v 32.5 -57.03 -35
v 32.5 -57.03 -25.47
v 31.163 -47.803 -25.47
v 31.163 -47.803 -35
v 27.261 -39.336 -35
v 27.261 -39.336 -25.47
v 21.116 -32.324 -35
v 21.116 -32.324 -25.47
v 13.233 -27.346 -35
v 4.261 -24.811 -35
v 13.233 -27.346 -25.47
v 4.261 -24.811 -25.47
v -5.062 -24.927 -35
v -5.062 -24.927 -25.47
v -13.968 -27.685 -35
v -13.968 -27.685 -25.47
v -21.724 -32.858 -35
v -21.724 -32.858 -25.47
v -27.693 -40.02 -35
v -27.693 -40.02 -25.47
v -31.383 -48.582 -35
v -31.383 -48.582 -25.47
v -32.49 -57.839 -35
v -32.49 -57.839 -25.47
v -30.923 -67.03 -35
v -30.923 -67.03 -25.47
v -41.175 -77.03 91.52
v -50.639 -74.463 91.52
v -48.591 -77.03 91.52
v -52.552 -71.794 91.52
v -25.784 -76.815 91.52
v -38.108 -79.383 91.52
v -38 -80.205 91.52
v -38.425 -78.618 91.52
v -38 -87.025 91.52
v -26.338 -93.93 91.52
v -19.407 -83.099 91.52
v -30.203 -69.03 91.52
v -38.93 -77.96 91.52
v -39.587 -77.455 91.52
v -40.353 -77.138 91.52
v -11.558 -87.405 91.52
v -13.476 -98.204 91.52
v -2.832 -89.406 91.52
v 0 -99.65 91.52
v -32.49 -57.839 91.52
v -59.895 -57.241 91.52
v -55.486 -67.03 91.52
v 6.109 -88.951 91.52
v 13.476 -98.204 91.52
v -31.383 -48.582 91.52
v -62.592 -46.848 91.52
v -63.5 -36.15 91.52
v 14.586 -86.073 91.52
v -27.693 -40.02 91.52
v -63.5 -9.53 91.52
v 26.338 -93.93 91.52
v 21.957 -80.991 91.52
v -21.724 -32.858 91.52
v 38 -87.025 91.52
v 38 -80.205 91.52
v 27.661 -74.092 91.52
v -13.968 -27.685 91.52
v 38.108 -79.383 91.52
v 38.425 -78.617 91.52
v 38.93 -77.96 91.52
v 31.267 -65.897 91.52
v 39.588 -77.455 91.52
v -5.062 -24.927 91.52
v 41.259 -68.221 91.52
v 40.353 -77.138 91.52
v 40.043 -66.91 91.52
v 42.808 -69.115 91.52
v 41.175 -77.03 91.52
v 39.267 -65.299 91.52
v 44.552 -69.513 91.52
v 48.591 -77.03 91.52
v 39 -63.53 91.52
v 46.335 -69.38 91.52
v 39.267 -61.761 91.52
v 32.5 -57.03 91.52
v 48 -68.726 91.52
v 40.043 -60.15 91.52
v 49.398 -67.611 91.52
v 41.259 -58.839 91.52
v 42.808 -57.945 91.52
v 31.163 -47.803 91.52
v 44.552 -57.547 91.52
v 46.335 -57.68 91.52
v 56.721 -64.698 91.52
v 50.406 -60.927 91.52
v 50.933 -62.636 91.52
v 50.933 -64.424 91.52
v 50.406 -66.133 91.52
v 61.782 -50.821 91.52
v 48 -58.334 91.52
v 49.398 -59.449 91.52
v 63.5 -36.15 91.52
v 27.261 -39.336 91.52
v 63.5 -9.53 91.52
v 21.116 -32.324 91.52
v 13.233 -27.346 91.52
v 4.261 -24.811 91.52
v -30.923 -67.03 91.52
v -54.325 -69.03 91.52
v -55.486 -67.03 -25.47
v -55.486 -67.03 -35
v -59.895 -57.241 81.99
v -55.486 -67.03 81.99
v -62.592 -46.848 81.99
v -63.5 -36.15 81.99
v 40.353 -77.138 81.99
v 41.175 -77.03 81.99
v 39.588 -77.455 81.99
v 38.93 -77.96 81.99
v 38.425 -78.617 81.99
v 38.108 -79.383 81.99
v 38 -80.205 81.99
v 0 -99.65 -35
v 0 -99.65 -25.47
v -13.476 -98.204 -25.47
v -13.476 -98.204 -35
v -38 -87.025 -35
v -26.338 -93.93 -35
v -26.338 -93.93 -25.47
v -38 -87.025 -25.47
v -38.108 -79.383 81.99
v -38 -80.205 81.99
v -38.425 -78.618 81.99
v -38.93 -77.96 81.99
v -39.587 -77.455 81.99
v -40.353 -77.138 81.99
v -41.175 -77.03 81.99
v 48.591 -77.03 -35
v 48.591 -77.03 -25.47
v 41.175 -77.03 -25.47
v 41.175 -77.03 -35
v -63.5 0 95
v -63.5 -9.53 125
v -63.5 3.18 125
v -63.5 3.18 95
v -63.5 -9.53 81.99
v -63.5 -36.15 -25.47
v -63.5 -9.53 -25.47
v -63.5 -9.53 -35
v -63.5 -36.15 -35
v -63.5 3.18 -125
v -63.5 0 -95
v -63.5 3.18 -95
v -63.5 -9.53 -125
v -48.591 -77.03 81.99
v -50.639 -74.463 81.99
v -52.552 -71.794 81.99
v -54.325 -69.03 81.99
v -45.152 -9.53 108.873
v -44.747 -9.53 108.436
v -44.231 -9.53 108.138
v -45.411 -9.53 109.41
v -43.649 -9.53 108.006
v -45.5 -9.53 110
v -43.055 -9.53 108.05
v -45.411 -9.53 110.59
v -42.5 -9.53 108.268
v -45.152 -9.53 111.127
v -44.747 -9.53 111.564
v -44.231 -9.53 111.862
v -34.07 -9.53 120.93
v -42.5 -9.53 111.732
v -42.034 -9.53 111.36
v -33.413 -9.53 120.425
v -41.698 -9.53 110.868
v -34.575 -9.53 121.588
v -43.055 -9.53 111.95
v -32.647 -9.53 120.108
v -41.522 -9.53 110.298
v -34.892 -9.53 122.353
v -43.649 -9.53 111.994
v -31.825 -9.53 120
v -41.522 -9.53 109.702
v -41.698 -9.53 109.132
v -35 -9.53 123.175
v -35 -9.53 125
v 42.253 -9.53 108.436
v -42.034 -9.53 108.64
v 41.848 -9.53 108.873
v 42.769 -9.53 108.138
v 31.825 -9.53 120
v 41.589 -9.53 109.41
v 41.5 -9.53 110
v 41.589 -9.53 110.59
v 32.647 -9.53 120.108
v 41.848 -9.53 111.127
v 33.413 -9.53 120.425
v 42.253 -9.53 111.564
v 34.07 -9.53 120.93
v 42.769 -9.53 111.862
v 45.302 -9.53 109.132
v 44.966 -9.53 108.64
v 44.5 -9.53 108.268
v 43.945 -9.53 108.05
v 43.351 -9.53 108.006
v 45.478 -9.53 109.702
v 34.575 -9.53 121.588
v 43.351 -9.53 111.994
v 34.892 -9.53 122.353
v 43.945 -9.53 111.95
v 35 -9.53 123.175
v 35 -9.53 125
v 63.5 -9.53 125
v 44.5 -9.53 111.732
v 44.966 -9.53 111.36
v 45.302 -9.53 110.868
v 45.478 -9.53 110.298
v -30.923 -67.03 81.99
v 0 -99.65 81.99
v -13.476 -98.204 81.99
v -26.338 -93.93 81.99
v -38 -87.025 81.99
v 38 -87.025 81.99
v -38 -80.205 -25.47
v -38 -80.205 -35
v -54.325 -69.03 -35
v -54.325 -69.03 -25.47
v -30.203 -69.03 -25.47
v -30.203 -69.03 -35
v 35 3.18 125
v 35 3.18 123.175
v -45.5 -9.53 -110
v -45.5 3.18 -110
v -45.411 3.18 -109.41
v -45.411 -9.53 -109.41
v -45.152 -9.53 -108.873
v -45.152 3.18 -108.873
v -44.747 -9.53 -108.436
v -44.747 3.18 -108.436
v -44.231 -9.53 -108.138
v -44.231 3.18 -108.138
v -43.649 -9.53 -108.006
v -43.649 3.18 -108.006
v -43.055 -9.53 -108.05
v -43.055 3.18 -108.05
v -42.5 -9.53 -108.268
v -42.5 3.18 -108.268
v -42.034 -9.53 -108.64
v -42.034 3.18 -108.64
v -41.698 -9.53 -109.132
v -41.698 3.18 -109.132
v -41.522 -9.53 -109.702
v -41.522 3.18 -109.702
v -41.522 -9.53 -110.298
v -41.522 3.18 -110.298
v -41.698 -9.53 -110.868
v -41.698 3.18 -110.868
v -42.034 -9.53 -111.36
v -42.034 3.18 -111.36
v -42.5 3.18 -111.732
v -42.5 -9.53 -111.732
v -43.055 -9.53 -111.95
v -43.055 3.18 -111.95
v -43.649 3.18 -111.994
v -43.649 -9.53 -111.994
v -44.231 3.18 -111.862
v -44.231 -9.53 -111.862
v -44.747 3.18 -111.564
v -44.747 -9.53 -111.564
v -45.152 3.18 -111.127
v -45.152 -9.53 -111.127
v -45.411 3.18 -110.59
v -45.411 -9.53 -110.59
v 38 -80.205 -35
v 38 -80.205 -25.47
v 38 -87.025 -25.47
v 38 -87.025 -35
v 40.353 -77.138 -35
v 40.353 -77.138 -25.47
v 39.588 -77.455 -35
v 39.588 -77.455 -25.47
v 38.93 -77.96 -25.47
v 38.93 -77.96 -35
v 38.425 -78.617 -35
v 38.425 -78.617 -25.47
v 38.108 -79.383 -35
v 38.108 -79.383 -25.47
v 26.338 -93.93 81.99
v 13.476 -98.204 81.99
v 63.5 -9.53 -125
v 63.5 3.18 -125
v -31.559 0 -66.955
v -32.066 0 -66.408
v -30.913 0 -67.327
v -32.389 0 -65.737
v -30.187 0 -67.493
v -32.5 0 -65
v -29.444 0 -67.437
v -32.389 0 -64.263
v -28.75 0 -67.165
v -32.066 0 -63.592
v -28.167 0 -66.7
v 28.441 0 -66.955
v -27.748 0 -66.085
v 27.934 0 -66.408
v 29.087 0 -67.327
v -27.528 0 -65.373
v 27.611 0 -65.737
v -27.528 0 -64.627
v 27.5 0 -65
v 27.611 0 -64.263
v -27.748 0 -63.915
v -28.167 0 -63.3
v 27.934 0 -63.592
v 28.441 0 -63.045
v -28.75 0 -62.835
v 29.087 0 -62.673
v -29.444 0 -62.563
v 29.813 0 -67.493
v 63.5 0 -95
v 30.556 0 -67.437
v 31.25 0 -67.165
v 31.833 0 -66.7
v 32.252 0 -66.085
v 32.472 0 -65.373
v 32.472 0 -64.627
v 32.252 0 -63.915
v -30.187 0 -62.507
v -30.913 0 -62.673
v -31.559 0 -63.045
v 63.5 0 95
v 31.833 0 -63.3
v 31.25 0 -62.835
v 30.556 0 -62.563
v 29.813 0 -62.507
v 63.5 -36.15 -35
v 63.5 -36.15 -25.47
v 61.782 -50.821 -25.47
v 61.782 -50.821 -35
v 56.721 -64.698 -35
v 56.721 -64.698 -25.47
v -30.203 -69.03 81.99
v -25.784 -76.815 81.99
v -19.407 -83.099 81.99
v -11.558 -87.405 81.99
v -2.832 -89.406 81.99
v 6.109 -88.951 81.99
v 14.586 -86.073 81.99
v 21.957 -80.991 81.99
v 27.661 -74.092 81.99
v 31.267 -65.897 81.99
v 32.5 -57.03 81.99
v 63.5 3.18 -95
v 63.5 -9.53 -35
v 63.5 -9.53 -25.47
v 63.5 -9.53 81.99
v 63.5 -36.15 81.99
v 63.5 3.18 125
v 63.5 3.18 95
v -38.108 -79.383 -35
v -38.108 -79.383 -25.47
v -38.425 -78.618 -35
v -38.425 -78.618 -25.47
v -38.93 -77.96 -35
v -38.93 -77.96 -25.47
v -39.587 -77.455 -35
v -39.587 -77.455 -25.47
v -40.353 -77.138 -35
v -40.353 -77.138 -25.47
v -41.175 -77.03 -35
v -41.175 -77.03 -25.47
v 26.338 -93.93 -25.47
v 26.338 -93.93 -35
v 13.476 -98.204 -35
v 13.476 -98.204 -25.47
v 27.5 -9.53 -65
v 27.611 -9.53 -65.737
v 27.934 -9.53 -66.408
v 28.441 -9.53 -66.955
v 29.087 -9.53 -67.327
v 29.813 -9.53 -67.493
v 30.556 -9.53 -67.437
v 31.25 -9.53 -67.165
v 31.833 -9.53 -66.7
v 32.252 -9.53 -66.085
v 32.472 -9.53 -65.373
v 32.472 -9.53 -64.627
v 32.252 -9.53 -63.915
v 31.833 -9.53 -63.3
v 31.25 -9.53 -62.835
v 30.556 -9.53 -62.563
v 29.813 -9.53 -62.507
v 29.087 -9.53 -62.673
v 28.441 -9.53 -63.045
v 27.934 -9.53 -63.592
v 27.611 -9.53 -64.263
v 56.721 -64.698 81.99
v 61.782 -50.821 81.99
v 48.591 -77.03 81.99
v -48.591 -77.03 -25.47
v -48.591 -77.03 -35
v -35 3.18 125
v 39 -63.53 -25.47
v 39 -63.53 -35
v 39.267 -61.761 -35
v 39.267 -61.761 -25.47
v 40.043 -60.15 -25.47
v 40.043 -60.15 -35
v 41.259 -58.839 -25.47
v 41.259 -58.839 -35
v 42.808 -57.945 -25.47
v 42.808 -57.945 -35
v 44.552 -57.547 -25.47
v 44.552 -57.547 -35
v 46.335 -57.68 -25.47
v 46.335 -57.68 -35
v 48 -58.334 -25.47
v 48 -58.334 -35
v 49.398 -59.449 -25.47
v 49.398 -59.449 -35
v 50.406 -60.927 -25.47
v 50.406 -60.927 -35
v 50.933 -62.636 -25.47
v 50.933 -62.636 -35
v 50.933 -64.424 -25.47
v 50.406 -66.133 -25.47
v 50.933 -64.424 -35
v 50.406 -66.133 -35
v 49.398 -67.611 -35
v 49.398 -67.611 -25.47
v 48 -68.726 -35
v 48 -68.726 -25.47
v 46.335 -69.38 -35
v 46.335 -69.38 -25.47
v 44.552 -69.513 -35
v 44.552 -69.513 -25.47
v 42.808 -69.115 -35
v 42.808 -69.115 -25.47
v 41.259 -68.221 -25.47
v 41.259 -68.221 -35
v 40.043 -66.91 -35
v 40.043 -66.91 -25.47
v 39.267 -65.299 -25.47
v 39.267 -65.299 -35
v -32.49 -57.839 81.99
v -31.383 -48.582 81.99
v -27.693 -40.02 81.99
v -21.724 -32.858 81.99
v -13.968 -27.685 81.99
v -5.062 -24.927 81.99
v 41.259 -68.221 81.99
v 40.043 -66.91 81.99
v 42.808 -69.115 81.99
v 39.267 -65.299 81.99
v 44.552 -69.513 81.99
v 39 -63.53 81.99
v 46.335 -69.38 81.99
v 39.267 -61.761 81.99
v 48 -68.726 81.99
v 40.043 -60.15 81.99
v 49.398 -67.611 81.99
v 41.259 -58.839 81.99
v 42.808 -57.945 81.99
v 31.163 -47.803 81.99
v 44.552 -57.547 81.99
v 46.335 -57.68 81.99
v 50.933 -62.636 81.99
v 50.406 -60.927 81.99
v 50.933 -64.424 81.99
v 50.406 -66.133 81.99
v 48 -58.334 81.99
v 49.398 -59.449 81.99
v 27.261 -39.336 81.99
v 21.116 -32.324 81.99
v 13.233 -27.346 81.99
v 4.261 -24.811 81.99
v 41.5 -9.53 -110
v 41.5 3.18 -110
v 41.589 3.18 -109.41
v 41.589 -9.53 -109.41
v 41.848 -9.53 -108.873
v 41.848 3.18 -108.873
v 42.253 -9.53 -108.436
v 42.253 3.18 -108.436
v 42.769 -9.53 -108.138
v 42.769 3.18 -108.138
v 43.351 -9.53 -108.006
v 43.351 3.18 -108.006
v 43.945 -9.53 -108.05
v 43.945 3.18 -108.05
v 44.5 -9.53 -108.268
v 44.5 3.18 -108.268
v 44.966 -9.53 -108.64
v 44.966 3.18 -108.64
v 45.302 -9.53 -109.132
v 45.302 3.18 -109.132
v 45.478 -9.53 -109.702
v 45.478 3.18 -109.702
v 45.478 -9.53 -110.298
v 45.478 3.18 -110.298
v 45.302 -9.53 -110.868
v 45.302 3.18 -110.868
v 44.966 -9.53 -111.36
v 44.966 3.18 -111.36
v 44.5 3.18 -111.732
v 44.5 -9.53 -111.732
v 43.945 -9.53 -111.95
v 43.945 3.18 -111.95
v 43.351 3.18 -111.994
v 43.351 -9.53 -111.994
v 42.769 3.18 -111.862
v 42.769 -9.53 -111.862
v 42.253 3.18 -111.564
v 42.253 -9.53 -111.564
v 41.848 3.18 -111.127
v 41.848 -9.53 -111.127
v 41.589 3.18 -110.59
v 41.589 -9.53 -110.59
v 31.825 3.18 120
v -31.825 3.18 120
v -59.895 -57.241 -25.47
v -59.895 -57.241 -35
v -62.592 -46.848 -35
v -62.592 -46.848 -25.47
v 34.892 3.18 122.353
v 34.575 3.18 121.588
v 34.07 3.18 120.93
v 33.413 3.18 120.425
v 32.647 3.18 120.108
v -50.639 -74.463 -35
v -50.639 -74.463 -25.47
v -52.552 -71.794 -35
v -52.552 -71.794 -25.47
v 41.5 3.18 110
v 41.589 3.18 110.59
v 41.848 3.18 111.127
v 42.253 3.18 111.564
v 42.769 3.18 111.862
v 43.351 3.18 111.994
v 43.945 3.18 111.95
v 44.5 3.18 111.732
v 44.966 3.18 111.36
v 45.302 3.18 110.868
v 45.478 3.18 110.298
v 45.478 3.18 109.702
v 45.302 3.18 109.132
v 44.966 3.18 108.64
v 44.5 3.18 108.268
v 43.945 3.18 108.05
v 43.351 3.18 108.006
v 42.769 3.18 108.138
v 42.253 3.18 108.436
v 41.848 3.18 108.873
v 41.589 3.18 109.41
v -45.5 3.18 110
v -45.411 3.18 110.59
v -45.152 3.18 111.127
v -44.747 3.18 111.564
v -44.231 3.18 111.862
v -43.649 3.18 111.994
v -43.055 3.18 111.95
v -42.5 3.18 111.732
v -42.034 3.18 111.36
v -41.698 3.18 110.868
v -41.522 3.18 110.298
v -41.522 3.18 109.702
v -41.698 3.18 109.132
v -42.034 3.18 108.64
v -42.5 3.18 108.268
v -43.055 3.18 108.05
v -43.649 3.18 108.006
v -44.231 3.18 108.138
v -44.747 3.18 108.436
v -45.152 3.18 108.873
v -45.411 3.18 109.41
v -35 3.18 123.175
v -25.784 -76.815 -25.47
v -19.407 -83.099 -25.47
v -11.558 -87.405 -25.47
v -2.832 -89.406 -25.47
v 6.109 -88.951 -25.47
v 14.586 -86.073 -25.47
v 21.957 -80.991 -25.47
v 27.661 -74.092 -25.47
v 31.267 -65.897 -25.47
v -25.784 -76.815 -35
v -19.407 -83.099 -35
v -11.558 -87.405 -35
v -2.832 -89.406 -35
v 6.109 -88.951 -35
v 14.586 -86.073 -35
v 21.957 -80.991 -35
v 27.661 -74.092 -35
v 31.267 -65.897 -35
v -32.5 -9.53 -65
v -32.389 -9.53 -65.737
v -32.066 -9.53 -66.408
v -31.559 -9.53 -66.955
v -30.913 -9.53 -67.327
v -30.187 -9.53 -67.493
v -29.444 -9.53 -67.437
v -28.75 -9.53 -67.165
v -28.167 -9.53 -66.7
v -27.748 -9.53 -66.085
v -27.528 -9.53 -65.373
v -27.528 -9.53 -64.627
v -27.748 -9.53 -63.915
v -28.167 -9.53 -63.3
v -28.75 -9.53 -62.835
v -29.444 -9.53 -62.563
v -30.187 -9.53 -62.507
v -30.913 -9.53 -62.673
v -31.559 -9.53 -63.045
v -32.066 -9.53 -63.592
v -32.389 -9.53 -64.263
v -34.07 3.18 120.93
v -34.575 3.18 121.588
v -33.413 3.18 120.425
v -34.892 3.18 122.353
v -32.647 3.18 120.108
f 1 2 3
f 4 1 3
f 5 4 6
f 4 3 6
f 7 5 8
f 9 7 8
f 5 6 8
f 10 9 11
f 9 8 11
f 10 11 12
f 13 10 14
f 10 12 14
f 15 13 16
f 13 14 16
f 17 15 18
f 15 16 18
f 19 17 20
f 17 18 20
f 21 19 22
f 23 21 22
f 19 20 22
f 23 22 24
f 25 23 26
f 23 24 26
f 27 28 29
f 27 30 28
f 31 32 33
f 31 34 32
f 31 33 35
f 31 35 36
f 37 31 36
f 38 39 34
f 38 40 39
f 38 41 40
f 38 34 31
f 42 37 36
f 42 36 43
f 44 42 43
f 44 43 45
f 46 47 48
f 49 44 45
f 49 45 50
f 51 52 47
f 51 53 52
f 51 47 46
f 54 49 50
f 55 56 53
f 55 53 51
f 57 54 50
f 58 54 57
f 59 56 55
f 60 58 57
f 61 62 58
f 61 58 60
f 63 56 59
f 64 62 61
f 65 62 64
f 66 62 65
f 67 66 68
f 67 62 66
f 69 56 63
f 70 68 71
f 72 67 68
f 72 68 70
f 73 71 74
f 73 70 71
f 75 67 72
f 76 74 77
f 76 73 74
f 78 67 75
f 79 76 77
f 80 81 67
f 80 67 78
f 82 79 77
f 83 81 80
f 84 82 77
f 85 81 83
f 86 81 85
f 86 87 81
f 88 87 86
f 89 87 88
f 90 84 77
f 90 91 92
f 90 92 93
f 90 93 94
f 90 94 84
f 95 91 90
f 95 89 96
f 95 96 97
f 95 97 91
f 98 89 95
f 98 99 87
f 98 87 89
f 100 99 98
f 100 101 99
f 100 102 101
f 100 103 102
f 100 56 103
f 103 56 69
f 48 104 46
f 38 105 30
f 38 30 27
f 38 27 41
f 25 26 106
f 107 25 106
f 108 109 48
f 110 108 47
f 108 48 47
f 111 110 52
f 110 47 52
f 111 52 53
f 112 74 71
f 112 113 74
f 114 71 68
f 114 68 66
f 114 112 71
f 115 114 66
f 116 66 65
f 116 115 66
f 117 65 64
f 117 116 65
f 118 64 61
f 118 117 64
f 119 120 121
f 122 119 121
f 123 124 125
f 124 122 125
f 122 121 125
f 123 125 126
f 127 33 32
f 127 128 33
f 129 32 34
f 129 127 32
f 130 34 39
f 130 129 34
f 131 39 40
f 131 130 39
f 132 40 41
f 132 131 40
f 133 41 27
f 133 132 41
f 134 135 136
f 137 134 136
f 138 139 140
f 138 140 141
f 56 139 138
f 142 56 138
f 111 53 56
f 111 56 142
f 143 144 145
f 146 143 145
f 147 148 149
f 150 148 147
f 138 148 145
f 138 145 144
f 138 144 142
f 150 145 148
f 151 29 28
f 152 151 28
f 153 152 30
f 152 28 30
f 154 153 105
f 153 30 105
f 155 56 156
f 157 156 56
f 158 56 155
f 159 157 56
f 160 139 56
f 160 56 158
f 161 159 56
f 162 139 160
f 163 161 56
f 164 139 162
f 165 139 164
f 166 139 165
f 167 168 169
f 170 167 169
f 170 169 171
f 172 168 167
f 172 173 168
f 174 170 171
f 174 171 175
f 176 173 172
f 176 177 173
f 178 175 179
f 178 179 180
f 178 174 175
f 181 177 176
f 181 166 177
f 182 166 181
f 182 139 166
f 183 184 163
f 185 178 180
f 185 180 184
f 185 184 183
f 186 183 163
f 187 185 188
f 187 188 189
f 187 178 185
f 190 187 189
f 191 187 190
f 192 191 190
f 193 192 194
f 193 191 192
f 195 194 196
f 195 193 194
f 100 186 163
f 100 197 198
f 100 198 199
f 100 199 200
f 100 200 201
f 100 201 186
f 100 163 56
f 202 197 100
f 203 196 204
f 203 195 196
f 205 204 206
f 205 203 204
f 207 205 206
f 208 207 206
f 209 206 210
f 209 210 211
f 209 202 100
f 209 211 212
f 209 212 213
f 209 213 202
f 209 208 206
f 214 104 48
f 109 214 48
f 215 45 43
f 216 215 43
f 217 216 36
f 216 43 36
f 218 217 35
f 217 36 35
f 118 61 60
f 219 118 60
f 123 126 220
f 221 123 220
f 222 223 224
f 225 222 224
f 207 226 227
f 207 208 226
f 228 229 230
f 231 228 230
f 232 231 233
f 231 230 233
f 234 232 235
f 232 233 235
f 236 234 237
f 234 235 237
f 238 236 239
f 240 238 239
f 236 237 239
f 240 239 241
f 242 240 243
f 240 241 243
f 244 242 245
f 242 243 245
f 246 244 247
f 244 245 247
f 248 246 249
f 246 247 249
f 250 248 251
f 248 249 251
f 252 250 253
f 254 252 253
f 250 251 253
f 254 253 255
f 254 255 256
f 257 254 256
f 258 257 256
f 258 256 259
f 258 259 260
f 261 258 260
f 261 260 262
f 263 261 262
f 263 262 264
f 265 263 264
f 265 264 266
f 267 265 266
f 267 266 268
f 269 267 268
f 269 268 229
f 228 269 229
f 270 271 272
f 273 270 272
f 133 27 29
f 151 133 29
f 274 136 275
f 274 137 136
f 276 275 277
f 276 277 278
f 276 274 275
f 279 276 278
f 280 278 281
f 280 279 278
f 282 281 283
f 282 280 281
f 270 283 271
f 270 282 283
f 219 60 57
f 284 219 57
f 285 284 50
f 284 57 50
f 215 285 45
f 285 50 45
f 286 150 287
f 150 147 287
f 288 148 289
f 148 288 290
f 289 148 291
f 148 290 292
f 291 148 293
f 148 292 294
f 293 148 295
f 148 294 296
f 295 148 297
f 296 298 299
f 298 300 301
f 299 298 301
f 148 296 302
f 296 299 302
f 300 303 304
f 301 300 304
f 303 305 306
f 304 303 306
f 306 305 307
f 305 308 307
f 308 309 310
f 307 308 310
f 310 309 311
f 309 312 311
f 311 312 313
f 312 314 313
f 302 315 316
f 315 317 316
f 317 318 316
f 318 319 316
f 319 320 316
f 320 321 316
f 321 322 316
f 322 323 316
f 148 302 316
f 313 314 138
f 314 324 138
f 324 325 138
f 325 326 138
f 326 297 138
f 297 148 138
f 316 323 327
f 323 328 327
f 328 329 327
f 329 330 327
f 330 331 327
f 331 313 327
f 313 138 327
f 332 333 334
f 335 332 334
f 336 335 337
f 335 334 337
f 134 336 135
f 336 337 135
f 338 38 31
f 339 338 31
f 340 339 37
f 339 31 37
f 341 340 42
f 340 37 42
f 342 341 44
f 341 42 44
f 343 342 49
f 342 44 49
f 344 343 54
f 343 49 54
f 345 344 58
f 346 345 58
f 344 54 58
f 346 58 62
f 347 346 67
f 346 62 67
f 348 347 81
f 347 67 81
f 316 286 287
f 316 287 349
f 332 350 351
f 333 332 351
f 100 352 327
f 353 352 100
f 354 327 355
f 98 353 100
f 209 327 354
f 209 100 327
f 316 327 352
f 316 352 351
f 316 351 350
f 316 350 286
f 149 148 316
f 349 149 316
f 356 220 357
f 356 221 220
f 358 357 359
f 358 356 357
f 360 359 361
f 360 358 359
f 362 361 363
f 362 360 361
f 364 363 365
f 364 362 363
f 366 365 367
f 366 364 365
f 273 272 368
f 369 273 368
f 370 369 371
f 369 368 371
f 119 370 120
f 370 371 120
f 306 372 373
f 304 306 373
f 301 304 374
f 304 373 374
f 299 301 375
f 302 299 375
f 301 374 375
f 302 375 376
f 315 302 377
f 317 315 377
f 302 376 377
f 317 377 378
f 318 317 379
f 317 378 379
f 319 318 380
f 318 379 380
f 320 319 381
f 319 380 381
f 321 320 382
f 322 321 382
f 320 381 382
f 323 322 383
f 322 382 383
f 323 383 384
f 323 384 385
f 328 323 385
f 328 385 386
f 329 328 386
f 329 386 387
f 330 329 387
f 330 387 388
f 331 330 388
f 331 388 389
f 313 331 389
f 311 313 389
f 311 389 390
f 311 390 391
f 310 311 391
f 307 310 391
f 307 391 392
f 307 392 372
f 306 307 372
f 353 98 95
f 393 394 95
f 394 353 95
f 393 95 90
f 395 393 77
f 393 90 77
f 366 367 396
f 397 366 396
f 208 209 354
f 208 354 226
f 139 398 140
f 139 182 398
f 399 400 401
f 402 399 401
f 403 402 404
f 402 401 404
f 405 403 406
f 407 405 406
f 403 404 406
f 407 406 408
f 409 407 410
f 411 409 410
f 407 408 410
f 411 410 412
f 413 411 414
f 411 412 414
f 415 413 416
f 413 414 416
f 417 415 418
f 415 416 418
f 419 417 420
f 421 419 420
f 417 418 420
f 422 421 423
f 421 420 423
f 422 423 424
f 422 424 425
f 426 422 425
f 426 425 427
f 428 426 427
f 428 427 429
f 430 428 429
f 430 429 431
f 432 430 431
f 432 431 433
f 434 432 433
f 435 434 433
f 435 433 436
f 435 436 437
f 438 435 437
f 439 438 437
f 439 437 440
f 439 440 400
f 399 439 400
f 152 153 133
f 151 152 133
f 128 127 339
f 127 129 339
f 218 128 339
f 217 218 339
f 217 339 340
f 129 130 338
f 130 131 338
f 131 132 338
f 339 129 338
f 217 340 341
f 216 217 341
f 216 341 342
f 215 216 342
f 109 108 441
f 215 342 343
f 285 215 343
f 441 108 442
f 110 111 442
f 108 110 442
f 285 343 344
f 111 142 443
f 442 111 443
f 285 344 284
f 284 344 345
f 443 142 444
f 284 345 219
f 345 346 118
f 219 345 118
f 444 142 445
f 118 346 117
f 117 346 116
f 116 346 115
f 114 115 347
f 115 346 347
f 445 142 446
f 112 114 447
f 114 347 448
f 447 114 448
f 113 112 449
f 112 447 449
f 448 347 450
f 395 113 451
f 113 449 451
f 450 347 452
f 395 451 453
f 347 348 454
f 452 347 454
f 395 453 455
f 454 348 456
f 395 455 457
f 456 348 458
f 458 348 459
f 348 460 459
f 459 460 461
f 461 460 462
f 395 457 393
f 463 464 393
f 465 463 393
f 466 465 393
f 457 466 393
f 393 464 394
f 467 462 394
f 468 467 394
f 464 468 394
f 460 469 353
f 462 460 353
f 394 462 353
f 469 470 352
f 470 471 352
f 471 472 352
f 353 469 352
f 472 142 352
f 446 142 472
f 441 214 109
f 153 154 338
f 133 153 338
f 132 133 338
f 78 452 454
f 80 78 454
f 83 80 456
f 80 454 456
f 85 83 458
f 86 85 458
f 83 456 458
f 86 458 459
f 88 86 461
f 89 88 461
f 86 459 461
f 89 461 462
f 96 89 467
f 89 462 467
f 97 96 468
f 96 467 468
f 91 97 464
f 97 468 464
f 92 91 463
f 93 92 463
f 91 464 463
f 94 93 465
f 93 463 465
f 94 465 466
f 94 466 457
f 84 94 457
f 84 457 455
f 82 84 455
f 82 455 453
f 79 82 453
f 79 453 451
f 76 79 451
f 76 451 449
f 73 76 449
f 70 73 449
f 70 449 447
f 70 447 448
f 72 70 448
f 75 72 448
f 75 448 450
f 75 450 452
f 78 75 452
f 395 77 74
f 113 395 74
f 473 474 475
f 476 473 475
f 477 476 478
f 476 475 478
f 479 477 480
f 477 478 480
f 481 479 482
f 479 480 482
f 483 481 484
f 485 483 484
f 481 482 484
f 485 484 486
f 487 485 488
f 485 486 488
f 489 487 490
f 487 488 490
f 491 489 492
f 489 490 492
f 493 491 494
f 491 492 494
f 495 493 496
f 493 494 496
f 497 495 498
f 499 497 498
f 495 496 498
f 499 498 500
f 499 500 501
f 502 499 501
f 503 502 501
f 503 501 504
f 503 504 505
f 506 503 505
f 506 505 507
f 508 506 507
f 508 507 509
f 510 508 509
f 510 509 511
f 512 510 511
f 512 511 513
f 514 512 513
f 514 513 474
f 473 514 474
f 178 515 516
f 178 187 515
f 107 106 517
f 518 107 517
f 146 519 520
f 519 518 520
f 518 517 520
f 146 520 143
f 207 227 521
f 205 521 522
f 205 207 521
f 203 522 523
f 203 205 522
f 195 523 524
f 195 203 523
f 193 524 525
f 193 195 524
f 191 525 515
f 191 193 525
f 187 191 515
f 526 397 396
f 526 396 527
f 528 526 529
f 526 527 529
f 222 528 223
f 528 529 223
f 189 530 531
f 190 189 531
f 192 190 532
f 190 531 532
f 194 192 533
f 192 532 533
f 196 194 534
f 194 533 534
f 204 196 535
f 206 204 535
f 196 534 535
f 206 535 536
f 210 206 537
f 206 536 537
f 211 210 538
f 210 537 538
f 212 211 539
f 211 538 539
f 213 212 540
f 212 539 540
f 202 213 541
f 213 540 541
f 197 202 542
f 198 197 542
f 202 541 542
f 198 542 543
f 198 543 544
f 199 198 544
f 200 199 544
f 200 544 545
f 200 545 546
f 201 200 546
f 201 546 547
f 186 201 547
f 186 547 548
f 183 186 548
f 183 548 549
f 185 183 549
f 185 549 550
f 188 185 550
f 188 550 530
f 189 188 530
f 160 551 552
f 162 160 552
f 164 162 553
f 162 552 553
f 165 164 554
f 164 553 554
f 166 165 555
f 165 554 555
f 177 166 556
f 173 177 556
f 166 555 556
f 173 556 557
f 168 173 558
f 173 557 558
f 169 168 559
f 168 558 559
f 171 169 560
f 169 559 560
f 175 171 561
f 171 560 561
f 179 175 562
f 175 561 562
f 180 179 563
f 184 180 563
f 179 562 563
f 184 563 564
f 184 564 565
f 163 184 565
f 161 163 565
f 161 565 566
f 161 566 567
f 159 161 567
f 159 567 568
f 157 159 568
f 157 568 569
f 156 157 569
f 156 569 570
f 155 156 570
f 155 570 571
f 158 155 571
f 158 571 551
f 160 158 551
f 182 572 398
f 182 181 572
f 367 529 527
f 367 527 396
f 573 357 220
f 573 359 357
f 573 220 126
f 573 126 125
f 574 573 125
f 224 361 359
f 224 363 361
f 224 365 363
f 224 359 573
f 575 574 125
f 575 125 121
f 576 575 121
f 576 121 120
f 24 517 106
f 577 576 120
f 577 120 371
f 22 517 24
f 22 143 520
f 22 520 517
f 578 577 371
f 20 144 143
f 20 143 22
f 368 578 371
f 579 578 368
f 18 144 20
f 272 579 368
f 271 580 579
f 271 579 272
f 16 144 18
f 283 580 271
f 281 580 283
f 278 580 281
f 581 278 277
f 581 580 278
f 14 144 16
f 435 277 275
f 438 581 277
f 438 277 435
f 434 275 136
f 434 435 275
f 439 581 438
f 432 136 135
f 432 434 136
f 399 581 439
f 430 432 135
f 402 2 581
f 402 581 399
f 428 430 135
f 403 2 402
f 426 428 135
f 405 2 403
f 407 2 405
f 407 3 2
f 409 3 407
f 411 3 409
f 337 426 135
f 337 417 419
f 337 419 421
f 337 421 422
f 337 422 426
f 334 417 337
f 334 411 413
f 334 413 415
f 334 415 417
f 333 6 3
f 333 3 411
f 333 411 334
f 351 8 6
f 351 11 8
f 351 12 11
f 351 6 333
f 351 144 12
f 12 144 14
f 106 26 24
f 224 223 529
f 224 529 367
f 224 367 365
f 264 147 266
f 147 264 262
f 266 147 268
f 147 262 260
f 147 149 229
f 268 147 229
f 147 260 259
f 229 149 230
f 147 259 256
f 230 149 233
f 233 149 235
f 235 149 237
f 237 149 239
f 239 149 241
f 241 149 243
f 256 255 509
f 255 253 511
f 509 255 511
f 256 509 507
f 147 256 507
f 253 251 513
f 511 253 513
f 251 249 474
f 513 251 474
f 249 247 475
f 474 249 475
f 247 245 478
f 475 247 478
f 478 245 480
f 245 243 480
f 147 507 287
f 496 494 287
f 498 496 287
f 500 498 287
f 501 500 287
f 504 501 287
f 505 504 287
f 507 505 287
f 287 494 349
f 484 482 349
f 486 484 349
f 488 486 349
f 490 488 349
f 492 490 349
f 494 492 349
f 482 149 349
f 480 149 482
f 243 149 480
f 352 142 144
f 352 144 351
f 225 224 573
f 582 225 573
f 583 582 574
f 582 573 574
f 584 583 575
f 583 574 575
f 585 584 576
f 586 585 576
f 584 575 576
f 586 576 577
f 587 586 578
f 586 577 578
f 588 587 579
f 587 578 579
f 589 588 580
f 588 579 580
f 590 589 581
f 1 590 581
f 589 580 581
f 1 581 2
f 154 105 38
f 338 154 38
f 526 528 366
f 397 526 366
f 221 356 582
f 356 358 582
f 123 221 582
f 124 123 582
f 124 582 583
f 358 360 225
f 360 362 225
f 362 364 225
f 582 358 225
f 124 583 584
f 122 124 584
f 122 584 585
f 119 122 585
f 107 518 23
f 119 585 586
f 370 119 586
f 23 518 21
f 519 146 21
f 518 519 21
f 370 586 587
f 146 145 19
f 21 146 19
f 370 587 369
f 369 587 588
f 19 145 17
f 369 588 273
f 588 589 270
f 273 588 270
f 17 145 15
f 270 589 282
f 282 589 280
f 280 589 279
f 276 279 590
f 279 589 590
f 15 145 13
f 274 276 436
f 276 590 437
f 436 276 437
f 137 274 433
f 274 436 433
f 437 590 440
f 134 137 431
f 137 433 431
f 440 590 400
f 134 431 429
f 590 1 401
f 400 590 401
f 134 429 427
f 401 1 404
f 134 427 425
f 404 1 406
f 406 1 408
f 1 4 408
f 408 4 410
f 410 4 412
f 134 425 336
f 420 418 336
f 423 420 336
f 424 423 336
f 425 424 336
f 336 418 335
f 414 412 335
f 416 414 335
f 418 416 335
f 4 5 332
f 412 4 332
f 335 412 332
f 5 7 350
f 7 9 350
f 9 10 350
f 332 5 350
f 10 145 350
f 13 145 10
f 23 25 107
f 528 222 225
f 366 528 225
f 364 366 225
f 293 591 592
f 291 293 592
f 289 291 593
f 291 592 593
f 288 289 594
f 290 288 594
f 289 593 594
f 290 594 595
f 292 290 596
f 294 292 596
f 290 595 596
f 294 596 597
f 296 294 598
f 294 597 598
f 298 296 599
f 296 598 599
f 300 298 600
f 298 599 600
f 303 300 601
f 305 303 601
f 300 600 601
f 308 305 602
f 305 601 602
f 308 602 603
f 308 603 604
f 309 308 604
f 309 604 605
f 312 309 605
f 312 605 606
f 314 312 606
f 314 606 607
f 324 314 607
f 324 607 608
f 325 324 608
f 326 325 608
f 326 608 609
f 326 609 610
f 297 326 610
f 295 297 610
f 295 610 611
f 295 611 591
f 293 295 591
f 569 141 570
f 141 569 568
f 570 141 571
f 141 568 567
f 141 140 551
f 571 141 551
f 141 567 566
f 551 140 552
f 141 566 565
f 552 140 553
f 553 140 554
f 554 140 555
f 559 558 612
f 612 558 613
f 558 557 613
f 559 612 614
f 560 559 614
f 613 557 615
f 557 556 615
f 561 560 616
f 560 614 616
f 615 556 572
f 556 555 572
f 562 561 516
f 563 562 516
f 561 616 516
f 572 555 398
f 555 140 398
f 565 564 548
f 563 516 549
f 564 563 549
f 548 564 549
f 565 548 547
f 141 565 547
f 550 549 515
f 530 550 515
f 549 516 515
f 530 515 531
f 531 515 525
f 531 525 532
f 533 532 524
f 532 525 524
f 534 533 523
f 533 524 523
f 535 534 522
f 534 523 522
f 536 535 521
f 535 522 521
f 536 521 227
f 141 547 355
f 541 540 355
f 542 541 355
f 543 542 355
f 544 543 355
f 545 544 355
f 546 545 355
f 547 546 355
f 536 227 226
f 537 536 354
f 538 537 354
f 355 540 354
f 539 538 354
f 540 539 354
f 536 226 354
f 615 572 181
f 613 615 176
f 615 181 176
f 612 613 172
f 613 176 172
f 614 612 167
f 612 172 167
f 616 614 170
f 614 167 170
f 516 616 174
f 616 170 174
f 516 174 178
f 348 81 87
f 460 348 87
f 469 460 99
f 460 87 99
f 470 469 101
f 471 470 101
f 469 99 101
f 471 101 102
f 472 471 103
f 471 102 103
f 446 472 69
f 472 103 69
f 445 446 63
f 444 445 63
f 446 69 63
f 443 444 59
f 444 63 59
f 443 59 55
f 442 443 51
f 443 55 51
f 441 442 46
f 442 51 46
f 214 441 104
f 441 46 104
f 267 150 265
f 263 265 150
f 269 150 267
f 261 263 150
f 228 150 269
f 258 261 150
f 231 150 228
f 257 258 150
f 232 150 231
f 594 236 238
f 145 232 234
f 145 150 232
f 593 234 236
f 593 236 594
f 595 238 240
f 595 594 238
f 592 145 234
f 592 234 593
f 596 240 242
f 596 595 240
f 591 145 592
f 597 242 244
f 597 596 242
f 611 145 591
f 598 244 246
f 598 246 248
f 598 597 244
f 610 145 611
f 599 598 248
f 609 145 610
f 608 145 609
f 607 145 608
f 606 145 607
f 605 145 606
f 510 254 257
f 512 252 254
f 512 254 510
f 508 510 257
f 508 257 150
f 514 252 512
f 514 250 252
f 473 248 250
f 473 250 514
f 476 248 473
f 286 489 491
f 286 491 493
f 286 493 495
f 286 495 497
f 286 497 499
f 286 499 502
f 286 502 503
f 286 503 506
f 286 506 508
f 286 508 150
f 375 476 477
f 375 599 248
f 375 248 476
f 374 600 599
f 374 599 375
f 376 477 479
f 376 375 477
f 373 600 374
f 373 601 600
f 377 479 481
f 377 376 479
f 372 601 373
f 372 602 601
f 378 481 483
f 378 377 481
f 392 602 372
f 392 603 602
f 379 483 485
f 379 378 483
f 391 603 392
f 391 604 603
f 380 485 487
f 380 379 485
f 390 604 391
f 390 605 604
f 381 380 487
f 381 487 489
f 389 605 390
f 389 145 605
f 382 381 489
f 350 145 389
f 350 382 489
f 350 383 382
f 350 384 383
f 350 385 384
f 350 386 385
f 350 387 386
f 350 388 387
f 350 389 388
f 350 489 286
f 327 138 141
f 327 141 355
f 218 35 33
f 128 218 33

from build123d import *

# Parameters (mm, degrees)
F0_W     = 127
F0_H     = 30
F0_H_2   = 190
F1_DEPTH = 9.53
F2_DEPTH = 3.18
F4_D     = 4
F5_D     = 5
F3_W     = 127
F3_H     = 9.53
F6_DEPTH = 90.12
F8_DEPTH = 216.521
F9_D     = 12
F10_R    = 3.175


with BuildPart() as f1:
    # F0 (on Front) → F1 (new body)
    with BuildSketch(Plane.XZ):
        with Locations((0, -110)):
            Rectangle(F0_W, F0_H)
        Rectangle(F0_W, F0_H_2)
        Polygon((-63.5, 95), (63.5, 95), (63.5, 125), (35, 125), (35, 120), (-35, 120), (-35, 125), (-63.5, 125), align=None)
    extrude(amount=F1_DEPTH)

    # F0 (on Front) → F2 (join)
    with BuildSketch(Plane.XZ):
        Polygon((-63.5, 95), (63.5, 95), (63.5, 125), (35, 125), (35, 120), (-35, 120), (-35, 125), (-63.5, 125), align=None)
        with Locations((0, -110)):
            Rectangle(F0_W, F0_H)
    extrude(amount=-F2_DEPTH)

    # F4 (through all)
    with Locations(Plane.XZ.offset(9.53)):
        with Locations((-43.5, 110), (43.5, 110), (-43.5, -110), (43.5, -110)):
            Hole(F4_D / 2)

    # F5 (through all)
    with Locations(Plane(origin=(0, 0, 0), x_dir=(1, 0, 0), z_dir=(0, 1, 0))):
        with Locations((-30, 65), (30, 65)):
            Hole(F5_D / 2)

    # F3 (on face) → F6 (join)
    with BuildSketch(Plane.XZ.offset(9.53)):
        with Locations((0, 86.755)):
            Rectangle(F3_W, F3_H)
        with Locations((0, -30.235)):
            Rectangle(F3_W, F3_H)
    extrude(amount=F6_DEPTH)

    # F7 (on face) → F8 (cut, through all)
    with BuildSketch(Plane.XY.offset(91.52)):
        with BuildLine():
            Line((-30.2034766211, -69.03), (-30.9232921921, -67.03))
            ThreePointArc((-30.9232921921, -67.03), (-30.5797394754, -68.0358863166), (-30.2034766211, -69.03))
        make_face()
        with BuildLine():
            ThreePointArc((-30.2034766211, -69.03), (6.1088873707, -88.9507063689), (32.5, -57.03))
            ThreePointArc((32.5, -57.03), (-5.0617686512, -24.9265967829), (-30.9232921921, -67.03))
            Line((-30.9232921921, -67.03), (-30.2034766211, -69.03))
        make_face()
        with BuildLine():
            ThreePointArc((-54.3245395747, -69.03), (-54.9142828433, -68.0352871997), (-55.4858144033, -67.03))
            ThreePointArc((-55.4858144033, -67.03), (-61.4638072959, -52.1015012677), (-63.5, -36.15))
            Line((-63.5, -36.15), (-63.5, -99.65))
            Line((-63.5, -99.65), (2.176e-07, -99.65))
            ThreePointArc((2.176e-07, -99.65), (-20.0212042966, -96.4111100007), (-38, -87.0248464371))
            ThreePointArc((-38, -87.0248464371), (-43.5829123177, -82.3320284732), (-48.5909003827, -77.03))
            ThreePointArc((-48.5909003827, -77.03), (-51.6129532715, -73.1412564614), (-54.3245395747, -69.03))
        make_face()
        with BuildLine():
            ThreePointArc((38, -87.0248464371), (20.0212045031, -96.4111099321), (2.176e-07, -99.65))
            Line((2.176e-07, -99.65), (63.5, -99.65))
            Line((63.5, -99.65), (63.5, -36.15))
            ThreePointArc((63.5, -36.15), (59.6564002195, -57.9069279277), (48.5909003827, -77.03))
            ThreePointArc((48.5909003827, -77.03), (43.5829123177, -82.3320284732), (38, -87.0248464371))
        make_face()
        with BuildLine():
            Line((-38, -77.03), (-48.5909003827, -77.03))
            ThreePointArc((-48.5909003827, -77.03), (-43.5829123177, -82.3320284732), (-38, -87.0248464371))
            Line((-38, -87.0248464371), (-38, -77.03))
        make_face()
        with BuildLine():
            Line((38, -77.03), (38, -87.0248464371))
            ThreePointArc((38, -87.0248464371), (43.5829123177, -82.3320284732), (48.5909003827, -77.03))
            Line((48.5909003827, -77.03), (38, -77.03))
        make_face()
        with BuildLine():
            ThreePointArc((-30.2034766211, -69.03), (-30.5797394754, -68.0358863166), (-30.9232921921, -67.03))
            Line((-30.9232921921, -67.03), (-55.4858144033, -67.03))
            ThreePointArc((-55.4858144033, -67.03), (-54.9142828433, -68.0352871997), (-54.3245395747, -69.03))
            Line((-54.3245395747, -69.03), (-30.2034766211, -69.03))
        make_face()
    extrude(amount=-F8_DEPTH, mode=Mode.SUBTRACT)

    # F9 (through all)
    with Locations(Plane.XY.offset(91.52)):
        with Locations((45, -63.53)):
            Hole(F9_D / 2)

    # F10
    f10_edges = [f1.edges().sort_by_distance(p)[0] for p in [
        (-38, -77.03, 86.755),
        (-38, -77.03, -30.235),
        (38, -77.03, -30.235),
        (38, -77.03, 86.755),
        (-35, -3.175, 120),
        (35, -3.175, 120),
    ]]
    fillet(f10_edges, radius=F10_R)


solid = f1.part
